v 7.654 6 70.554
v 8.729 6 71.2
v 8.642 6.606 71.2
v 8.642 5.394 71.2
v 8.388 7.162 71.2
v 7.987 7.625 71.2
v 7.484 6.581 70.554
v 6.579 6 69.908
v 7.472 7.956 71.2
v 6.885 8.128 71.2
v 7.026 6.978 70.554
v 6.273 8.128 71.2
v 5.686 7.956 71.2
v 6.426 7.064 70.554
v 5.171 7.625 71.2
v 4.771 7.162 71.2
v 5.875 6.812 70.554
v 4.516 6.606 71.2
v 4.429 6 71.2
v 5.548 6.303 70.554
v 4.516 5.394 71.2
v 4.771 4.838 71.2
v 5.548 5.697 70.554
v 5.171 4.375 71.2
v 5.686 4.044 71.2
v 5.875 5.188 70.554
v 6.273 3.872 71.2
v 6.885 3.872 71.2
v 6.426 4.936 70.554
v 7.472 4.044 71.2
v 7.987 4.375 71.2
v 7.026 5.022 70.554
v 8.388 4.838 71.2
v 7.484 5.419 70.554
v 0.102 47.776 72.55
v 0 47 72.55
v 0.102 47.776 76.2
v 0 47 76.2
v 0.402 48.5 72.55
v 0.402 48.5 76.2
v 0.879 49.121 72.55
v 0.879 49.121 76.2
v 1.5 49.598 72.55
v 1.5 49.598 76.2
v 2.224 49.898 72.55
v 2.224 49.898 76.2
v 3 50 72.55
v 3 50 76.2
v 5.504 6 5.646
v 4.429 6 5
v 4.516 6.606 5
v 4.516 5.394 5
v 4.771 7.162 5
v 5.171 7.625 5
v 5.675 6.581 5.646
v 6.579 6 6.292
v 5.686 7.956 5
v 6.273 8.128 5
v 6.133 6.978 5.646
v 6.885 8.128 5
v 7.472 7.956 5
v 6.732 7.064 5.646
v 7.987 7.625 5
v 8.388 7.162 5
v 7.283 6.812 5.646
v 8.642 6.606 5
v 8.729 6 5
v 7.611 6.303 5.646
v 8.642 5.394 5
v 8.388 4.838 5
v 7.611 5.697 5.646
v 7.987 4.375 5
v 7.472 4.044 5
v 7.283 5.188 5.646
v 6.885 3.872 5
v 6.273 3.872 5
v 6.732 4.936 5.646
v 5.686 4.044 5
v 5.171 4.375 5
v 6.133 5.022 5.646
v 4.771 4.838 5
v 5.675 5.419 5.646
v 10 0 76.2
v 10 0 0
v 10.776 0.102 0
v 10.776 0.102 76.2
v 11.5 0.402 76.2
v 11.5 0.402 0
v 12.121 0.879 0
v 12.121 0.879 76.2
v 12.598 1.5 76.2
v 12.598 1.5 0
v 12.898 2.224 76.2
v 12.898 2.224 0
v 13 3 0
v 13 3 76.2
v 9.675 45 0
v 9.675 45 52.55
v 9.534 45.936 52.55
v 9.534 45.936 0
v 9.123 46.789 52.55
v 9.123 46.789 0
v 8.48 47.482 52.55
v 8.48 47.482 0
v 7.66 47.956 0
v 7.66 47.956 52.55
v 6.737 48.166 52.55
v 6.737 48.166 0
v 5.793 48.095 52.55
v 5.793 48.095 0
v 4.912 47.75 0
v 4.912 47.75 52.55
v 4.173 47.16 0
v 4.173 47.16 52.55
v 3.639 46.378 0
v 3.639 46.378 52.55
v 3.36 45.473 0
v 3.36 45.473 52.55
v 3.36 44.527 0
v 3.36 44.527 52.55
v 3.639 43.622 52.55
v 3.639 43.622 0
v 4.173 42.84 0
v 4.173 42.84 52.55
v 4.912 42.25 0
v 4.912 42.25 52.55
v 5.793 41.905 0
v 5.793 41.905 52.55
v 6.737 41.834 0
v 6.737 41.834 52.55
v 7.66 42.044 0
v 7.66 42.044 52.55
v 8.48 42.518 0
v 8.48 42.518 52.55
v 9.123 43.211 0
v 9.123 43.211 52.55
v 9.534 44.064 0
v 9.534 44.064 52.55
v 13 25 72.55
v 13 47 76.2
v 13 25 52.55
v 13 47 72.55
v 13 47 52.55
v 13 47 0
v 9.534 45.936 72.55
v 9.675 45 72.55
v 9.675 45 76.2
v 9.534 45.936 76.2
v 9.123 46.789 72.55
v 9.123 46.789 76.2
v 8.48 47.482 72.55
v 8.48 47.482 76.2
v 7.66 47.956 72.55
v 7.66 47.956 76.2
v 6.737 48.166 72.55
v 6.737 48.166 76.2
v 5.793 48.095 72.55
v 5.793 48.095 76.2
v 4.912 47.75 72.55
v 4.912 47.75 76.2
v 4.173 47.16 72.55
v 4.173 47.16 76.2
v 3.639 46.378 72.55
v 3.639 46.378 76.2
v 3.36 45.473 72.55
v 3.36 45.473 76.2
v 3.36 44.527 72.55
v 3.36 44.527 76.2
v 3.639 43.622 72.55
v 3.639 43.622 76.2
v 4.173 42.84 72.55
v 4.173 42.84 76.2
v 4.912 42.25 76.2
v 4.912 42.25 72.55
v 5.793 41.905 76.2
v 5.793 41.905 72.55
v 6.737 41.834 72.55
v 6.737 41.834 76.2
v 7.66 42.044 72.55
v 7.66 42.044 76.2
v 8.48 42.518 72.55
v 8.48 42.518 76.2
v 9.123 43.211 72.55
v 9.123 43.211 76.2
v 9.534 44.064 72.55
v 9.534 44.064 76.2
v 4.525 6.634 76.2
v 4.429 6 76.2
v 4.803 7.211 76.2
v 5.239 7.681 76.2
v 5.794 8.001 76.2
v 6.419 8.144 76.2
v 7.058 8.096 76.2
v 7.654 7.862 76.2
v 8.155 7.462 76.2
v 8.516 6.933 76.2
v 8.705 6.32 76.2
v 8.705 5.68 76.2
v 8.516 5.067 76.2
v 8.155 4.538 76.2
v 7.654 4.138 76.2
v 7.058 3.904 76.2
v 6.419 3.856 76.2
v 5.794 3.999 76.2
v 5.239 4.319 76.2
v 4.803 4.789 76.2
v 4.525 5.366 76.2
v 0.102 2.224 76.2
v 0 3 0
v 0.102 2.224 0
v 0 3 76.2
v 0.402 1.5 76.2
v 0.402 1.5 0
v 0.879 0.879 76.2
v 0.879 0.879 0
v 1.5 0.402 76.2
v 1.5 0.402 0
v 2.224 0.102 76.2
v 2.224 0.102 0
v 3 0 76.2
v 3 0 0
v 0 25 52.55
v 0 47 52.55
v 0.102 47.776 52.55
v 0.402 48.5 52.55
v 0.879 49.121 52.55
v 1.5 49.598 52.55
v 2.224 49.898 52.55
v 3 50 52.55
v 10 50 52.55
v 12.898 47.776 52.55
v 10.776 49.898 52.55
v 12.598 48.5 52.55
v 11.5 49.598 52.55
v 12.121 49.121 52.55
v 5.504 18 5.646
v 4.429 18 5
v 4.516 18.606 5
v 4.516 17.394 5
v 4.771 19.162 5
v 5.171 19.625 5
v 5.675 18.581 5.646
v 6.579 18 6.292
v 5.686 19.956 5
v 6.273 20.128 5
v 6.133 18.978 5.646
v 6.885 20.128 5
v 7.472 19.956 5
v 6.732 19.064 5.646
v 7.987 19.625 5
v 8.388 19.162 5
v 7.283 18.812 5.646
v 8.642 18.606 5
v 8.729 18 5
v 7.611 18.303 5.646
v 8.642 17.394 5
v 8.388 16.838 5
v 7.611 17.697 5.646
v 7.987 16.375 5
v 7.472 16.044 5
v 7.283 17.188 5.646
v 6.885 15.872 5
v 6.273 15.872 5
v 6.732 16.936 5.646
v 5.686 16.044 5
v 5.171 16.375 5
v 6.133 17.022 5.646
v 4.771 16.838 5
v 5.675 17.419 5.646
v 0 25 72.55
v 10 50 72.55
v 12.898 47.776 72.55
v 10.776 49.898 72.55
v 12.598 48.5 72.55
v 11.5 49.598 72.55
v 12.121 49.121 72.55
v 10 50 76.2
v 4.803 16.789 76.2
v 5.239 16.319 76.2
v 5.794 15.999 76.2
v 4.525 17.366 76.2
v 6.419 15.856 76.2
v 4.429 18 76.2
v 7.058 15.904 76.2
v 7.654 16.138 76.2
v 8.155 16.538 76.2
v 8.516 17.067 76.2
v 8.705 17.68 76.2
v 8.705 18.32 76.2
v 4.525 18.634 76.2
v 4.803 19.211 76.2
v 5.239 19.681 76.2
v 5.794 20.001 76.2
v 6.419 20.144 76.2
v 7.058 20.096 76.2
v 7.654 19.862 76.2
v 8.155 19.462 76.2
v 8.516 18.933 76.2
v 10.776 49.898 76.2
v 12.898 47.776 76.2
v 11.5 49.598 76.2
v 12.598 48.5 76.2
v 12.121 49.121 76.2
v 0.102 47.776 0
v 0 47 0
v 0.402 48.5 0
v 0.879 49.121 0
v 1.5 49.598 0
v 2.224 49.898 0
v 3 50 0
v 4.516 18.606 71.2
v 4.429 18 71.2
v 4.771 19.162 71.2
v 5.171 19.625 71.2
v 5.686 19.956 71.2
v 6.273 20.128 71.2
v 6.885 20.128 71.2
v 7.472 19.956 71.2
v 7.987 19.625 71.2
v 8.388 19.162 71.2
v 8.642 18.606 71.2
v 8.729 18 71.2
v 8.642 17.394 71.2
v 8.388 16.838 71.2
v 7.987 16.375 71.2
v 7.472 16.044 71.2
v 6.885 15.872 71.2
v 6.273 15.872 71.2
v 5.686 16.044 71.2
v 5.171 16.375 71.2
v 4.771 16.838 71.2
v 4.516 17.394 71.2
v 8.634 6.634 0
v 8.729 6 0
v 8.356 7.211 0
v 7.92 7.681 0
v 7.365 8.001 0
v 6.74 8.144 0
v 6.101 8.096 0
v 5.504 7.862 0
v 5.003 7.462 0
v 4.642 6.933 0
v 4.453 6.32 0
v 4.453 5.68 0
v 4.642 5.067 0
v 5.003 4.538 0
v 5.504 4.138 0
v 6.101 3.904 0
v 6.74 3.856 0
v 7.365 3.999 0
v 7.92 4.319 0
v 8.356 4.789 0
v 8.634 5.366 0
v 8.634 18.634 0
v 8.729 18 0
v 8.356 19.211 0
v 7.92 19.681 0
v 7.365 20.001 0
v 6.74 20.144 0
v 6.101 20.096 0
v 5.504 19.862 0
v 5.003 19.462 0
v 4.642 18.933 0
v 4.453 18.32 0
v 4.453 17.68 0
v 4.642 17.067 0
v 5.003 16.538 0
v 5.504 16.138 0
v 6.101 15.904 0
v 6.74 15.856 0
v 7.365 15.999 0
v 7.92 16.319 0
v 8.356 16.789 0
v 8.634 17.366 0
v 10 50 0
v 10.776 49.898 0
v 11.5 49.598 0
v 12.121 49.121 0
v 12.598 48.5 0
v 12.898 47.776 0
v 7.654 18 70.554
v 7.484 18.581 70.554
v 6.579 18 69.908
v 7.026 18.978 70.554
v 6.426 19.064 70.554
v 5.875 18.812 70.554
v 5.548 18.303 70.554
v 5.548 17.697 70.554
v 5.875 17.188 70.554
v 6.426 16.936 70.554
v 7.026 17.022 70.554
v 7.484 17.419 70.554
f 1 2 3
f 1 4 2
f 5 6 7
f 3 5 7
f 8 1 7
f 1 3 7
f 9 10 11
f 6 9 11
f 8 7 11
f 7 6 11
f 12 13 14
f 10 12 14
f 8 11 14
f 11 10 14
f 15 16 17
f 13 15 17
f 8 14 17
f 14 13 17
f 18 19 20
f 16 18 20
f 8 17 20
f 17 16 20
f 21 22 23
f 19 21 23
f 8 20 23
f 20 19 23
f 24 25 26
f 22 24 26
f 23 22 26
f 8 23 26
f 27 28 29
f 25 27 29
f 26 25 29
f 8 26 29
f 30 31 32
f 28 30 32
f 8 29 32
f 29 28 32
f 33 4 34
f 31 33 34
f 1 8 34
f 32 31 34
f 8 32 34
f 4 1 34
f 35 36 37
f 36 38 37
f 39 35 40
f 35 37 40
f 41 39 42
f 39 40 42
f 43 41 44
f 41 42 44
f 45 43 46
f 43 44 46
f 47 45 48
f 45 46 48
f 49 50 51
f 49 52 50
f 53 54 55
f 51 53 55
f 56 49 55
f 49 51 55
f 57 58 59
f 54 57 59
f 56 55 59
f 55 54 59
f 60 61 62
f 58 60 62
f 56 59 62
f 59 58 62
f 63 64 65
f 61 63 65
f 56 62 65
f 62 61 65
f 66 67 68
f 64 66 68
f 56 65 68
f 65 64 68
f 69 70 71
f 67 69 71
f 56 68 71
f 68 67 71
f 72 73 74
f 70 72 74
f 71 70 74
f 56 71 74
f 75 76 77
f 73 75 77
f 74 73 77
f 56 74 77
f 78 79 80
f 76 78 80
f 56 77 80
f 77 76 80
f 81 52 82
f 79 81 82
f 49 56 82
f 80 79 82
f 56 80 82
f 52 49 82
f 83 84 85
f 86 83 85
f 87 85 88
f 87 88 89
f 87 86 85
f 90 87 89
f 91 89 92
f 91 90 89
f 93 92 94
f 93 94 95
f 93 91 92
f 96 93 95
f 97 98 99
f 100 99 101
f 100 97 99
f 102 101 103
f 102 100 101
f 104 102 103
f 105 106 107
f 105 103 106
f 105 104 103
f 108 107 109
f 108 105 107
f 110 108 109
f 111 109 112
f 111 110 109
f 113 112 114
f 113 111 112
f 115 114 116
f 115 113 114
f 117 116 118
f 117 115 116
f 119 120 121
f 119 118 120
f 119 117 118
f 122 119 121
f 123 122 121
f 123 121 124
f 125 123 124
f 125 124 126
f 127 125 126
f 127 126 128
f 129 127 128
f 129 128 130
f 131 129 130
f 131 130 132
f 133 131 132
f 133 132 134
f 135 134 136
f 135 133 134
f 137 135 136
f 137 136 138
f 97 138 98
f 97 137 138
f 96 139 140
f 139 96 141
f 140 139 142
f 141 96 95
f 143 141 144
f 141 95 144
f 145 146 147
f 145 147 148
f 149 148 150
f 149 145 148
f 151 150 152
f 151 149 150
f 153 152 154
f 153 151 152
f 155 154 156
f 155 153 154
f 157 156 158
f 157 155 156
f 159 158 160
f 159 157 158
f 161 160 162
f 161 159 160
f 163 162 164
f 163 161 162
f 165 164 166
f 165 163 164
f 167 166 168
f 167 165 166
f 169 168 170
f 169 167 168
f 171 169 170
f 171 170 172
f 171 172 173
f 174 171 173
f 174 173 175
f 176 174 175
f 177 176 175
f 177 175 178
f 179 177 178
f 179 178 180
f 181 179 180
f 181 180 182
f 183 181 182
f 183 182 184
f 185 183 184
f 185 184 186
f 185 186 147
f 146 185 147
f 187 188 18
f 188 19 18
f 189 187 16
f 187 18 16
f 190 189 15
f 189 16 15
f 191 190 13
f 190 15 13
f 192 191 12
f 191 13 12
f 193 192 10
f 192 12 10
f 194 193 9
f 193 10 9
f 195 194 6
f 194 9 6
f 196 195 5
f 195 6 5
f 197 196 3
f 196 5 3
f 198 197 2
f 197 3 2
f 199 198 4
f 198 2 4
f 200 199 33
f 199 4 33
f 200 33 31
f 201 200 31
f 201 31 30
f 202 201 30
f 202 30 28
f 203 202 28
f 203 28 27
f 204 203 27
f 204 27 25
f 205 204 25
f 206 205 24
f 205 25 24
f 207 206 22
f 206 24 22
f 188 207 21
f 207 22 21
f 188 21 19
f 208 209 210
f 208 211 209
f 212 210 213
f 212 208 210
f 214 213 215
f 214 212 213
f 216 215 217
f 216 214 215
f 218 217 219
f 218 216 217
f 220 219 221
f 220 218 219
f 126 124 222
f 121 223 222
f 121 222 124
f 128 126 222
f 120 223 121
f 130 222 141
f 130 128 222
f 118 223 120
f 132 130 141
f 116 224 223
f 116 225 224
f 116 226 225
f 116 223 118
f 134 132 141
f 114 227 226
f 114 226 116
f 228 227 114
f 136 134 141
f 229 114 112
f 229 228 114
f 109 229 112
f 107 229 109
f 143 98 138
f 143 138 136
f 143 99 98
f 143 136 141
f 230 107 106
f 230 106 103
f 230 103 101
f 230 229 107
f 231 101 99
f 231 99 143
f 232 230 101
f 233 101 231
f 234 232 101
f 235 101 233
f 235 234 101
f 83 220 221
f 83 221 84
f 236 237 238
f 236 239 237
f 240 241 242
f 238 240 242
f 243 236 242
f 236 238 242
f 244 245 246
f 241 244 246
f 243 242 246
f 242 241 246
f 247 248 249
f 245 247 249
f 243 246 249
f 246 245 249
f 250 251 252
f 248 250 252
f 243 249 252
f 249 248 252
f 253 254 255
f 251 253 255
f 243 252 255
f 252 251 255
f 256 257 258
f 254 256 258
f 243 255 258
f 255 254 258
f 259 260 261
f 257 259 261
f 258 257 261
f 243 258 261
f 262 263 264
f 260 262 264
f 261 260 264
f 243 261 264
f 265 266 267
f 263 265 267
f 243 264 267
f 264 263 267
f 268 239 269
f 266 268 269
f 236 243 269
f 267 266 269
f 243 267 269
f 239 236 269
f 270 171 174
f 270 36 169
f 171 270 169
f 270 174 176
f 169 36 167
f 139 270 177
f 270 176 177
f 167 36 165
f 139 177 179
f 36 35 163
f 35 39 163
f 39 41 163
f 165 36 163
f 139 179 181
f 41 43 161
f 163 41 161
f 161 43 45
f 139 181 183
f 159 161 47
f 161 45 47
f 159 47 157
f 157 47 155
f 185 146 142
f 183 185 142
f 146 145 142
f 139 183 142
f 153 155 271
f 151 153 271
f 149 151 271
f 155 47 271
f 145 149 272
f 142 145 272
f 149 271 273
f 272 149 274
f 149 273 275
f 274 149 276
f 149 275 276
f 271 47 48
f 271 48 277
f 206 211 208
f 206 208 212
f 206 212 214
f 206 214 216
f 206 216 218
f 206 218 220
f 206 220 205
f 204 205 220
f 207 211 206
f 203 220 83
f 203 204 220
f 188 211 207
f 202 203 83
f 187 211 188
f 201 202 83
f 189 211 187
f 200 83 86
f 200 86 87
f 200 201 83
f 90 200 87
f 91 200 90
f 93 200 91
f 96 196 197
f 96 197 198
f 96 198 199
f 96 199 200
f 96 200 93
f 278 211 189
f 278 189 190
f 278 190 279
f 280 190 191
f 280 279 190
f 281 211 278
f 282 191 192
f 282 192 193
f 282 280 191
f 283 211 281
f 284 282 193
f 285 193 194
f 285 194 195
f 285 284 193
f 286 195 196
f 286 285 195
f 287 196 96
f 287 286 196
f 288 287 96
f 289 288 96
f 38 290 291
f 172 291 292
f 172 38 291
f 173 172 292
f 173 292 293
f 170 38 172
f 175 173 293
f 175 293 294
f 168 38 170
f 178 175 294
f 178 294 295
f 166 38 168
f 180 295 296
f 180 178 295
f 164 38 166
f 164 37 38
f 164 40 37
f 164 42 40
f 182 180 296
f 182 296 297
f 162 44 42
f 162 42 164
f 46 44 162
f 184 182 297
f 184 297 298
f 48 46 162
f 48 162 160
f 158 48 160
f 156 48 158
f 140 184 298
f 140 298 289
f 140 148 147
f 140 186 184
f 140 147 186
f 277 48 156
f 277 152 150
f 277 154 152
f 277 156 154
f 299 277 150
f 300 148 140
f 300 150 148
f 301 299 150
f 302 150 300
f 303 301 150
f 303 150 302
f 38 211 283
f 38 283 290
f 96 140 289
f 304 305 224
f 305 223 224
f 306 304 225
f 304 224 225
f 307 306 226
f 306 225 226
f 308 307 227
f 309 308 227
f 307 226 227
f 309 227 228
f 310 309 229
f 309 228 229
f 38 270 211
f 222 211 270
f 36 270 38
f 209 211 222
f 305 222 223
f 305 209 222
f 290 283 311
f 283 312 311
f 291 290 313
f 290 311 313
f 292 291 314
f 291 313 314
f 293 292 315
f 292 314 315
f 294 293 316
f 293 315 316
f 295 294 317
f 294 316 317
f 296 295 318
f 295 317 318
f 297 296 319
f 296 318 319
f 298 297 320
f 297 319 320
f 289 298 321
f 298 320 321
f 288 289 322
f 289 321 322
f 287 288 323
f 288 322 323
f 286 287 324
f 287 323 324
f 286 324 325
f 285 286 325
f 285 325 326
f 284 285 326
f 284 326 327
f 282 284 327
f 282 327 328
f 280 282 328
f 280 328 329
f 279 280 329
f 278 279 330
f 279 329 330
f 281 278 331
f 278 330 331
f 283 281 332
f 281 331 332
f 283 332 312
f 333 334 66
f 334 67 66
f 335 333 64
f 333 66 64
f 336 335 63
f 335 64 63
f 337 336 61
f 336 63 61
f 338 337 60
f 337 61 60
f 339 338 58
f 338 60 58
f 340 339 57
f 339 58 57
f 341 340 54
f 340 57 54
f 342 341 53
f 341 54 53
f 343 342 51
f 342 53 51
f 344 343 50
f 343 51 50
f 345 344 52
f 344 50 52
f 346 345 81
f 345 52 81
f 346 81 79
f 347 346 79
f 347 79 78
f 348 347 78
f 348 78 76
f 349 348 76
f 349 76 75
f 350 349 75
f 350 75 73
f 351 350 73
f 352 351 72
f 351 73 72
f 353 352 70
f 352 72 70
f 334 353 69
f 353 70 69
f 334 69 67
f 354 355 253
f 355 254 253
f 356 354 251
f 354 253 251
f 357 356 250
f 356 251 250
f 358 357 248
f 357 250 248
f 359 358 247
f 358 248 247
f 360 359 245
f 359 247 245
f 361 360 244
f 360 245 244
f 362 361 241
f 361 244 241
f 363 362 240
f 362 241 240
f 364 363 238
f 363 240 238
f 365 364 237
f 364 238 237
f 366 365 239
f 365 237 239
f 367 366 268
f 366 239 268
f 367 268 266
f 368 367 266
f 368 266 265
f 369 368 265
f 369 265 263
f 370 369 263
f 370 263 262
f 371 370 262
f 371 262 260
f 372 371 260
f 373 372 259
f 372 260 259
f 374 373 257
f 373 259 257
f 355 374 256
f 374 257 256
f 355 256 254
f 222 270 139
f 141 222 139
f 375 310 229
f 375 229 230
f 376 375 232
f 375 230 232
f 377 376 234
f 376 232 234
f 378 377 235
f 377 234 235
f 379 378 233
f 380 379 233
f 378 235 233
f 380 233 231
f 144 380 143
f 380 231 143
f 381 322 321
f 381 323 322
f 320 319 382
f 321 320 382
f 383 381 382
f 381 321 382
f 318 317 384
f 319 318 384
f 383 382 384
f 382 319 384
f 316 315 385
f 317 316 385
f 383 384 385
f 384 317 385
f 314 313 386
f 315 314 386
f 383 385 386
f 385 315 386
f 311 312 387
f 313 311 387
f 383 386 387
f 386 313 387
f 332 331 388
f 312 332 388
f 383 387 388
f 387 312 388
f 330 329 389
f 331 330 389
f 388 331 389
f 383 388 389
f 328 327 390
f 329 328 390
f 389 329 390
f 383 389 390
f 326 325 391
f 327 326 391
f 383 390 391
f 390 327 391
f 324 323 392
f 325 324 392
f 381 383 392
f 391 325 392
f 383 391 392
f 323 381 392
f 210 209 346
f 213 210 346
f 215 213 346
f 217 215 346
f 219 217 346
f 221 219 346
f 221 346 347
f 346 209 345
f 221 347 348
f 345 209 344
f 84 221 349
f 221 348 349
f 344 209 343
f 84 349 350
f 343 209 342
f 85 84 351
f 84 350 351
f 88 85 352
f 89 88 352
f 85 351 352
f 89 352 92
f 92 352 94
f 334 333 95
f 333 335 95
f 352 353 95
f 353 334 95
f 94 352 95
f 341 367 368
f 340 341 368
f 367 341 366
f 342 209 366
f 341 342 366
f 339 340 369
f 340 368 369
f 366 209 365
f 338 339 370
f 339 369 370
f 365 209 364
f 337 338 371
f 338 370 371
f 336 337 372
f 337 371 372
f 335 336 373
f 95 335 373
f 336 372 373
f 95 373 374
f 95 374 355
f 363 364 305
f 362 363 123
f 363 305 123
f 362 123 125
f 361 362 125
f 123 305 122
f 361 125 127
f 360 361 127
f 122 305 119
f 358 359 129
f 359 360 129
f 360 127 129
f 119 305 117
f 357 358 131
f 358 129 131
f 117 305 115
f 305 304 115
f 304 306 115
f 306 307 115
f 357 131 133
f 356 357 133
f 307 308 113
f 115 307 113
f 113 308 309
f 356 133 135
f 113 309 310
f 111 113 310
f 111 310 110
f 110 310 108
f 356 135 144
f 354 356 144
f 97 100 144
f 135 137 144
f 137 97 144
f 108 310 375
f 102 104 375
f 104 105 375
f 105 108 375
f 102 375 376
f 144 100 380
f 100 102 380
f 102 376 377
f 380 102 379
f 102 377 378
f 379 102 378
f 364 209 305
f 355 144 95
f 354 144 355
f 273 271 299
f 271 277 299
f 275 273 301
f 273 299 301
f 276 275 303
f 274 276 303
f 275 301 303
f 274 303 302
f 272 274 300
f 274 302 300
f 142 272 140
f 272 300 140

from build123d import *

# Parameters (mm, degrees)
SKETCH1_W                = 13
SKETCH1_H                = 50
SKETCH1_R                = 3.175
BOSS_EXTRUDE1_DEPTH      = 76.2
SKETCH2_W                = 13
SKETCH2_H                = 25
CUT_EXTRUDE1_DEPTH       = 10
M4_CLEARANCE_HOLE1_D     = 4.3
M4_CLEARANCE_HOLE1_DEPTH = 5
M4_CLEARANCE_HOLE1_TIP   = 1.291850331
M4_CLEARANCE_HOLE2_D     = 4.3
M4_CLEARANCE_HOLE2_DEPTH = 5
M4_CLEARANCE_HOLE2_TIP   = 1.291850331
FILLET1_R                = 3


with BuildPart() as part:
    # Sketch1 → Boss-Extrude1 (new body)
    with BuildSketch(Plane.XY):
        with Locations((6.5, 25)):
            Rectangle(SKETCH1_W, SKETCH1_H)
        with Locations((6.5, 45)):
            Circle(SKETCH1_R, mode=Mode.SUBTRACT)
    extrude(amount=BOSS_EXTRUDE1_DEPTH)

    # Sketch2 → Cut-Extrude1 (cut, symmetric)
    with BuildSketch(Plane.XY.offset(62.55)):
        with Locations((6.5, 37.5)):
            Rectangle(SKETCH2_W, SKETCH2_H)
    extrude(amount=CUT_EXTRUDE1_DEPTH, both=True, mode=Mode.SUBTRACT)

    # M4 Clearance Hole1
    with Locations(Plane(origin=(0, 0, 0), x_dir=(-1, 0, 0), z_dir=(0, 0, -1))):
        with Locations((-6.579246302, 18), (-6.579246302, 6)):
            Hole(M4_CLEARANCE_HOLE1_D / 2, depth=M4_CLEARANCE_HOLE1_DEPTH)
            with Locations((0, 0, -(M4_CLEARANCE_HOLE1_DEPTH + M4_CLEARANCE_HOLE1_TIP / 2))):  # 118° drill point
                Cone(0, M4_CLEARANCE_HOLE1_D / 2, M4_CLEARANCE_HOLE1_TIP, mode=Mode.SUBTRACT)

    # M4 Clearance Hole2
    with Locations(Plane.XY.offset(76.2)):
        with Locations((6.579246302, 18), (6.579246302, 6)):
            Hole(M4_CLEARANCE_HOLE2_D / 2, depth=M4_CLEARANCE_HOLE2_DEPTH)
            with Locations((0, 0, -(M4_CLEARANCE_HOLE2_DEPTH + M4_CLEARANCE_HOLE2_TIP / 2))):  # 118° drill point
                Cone(0, M4_CLEARANCE_HOLE2_D / 2, M4_CLEARANCE_HOLE2_TIP, mode=Mode.SUBTRACT)

    # Fillet1
    fillet1_edges = [part.edges().sort_by_distance(p)[0] for p in [
        (0, 50, 26.275),
        (13, 50, 26.275),
        (0, 50, 74.375),
        (13, 50, 74.375),
        (13, 0, 38.1),
        (0, 0, 38.1),
    ]]
    fillet(fillet1_edges, radius=FILLET1_R)


solid = part.part
